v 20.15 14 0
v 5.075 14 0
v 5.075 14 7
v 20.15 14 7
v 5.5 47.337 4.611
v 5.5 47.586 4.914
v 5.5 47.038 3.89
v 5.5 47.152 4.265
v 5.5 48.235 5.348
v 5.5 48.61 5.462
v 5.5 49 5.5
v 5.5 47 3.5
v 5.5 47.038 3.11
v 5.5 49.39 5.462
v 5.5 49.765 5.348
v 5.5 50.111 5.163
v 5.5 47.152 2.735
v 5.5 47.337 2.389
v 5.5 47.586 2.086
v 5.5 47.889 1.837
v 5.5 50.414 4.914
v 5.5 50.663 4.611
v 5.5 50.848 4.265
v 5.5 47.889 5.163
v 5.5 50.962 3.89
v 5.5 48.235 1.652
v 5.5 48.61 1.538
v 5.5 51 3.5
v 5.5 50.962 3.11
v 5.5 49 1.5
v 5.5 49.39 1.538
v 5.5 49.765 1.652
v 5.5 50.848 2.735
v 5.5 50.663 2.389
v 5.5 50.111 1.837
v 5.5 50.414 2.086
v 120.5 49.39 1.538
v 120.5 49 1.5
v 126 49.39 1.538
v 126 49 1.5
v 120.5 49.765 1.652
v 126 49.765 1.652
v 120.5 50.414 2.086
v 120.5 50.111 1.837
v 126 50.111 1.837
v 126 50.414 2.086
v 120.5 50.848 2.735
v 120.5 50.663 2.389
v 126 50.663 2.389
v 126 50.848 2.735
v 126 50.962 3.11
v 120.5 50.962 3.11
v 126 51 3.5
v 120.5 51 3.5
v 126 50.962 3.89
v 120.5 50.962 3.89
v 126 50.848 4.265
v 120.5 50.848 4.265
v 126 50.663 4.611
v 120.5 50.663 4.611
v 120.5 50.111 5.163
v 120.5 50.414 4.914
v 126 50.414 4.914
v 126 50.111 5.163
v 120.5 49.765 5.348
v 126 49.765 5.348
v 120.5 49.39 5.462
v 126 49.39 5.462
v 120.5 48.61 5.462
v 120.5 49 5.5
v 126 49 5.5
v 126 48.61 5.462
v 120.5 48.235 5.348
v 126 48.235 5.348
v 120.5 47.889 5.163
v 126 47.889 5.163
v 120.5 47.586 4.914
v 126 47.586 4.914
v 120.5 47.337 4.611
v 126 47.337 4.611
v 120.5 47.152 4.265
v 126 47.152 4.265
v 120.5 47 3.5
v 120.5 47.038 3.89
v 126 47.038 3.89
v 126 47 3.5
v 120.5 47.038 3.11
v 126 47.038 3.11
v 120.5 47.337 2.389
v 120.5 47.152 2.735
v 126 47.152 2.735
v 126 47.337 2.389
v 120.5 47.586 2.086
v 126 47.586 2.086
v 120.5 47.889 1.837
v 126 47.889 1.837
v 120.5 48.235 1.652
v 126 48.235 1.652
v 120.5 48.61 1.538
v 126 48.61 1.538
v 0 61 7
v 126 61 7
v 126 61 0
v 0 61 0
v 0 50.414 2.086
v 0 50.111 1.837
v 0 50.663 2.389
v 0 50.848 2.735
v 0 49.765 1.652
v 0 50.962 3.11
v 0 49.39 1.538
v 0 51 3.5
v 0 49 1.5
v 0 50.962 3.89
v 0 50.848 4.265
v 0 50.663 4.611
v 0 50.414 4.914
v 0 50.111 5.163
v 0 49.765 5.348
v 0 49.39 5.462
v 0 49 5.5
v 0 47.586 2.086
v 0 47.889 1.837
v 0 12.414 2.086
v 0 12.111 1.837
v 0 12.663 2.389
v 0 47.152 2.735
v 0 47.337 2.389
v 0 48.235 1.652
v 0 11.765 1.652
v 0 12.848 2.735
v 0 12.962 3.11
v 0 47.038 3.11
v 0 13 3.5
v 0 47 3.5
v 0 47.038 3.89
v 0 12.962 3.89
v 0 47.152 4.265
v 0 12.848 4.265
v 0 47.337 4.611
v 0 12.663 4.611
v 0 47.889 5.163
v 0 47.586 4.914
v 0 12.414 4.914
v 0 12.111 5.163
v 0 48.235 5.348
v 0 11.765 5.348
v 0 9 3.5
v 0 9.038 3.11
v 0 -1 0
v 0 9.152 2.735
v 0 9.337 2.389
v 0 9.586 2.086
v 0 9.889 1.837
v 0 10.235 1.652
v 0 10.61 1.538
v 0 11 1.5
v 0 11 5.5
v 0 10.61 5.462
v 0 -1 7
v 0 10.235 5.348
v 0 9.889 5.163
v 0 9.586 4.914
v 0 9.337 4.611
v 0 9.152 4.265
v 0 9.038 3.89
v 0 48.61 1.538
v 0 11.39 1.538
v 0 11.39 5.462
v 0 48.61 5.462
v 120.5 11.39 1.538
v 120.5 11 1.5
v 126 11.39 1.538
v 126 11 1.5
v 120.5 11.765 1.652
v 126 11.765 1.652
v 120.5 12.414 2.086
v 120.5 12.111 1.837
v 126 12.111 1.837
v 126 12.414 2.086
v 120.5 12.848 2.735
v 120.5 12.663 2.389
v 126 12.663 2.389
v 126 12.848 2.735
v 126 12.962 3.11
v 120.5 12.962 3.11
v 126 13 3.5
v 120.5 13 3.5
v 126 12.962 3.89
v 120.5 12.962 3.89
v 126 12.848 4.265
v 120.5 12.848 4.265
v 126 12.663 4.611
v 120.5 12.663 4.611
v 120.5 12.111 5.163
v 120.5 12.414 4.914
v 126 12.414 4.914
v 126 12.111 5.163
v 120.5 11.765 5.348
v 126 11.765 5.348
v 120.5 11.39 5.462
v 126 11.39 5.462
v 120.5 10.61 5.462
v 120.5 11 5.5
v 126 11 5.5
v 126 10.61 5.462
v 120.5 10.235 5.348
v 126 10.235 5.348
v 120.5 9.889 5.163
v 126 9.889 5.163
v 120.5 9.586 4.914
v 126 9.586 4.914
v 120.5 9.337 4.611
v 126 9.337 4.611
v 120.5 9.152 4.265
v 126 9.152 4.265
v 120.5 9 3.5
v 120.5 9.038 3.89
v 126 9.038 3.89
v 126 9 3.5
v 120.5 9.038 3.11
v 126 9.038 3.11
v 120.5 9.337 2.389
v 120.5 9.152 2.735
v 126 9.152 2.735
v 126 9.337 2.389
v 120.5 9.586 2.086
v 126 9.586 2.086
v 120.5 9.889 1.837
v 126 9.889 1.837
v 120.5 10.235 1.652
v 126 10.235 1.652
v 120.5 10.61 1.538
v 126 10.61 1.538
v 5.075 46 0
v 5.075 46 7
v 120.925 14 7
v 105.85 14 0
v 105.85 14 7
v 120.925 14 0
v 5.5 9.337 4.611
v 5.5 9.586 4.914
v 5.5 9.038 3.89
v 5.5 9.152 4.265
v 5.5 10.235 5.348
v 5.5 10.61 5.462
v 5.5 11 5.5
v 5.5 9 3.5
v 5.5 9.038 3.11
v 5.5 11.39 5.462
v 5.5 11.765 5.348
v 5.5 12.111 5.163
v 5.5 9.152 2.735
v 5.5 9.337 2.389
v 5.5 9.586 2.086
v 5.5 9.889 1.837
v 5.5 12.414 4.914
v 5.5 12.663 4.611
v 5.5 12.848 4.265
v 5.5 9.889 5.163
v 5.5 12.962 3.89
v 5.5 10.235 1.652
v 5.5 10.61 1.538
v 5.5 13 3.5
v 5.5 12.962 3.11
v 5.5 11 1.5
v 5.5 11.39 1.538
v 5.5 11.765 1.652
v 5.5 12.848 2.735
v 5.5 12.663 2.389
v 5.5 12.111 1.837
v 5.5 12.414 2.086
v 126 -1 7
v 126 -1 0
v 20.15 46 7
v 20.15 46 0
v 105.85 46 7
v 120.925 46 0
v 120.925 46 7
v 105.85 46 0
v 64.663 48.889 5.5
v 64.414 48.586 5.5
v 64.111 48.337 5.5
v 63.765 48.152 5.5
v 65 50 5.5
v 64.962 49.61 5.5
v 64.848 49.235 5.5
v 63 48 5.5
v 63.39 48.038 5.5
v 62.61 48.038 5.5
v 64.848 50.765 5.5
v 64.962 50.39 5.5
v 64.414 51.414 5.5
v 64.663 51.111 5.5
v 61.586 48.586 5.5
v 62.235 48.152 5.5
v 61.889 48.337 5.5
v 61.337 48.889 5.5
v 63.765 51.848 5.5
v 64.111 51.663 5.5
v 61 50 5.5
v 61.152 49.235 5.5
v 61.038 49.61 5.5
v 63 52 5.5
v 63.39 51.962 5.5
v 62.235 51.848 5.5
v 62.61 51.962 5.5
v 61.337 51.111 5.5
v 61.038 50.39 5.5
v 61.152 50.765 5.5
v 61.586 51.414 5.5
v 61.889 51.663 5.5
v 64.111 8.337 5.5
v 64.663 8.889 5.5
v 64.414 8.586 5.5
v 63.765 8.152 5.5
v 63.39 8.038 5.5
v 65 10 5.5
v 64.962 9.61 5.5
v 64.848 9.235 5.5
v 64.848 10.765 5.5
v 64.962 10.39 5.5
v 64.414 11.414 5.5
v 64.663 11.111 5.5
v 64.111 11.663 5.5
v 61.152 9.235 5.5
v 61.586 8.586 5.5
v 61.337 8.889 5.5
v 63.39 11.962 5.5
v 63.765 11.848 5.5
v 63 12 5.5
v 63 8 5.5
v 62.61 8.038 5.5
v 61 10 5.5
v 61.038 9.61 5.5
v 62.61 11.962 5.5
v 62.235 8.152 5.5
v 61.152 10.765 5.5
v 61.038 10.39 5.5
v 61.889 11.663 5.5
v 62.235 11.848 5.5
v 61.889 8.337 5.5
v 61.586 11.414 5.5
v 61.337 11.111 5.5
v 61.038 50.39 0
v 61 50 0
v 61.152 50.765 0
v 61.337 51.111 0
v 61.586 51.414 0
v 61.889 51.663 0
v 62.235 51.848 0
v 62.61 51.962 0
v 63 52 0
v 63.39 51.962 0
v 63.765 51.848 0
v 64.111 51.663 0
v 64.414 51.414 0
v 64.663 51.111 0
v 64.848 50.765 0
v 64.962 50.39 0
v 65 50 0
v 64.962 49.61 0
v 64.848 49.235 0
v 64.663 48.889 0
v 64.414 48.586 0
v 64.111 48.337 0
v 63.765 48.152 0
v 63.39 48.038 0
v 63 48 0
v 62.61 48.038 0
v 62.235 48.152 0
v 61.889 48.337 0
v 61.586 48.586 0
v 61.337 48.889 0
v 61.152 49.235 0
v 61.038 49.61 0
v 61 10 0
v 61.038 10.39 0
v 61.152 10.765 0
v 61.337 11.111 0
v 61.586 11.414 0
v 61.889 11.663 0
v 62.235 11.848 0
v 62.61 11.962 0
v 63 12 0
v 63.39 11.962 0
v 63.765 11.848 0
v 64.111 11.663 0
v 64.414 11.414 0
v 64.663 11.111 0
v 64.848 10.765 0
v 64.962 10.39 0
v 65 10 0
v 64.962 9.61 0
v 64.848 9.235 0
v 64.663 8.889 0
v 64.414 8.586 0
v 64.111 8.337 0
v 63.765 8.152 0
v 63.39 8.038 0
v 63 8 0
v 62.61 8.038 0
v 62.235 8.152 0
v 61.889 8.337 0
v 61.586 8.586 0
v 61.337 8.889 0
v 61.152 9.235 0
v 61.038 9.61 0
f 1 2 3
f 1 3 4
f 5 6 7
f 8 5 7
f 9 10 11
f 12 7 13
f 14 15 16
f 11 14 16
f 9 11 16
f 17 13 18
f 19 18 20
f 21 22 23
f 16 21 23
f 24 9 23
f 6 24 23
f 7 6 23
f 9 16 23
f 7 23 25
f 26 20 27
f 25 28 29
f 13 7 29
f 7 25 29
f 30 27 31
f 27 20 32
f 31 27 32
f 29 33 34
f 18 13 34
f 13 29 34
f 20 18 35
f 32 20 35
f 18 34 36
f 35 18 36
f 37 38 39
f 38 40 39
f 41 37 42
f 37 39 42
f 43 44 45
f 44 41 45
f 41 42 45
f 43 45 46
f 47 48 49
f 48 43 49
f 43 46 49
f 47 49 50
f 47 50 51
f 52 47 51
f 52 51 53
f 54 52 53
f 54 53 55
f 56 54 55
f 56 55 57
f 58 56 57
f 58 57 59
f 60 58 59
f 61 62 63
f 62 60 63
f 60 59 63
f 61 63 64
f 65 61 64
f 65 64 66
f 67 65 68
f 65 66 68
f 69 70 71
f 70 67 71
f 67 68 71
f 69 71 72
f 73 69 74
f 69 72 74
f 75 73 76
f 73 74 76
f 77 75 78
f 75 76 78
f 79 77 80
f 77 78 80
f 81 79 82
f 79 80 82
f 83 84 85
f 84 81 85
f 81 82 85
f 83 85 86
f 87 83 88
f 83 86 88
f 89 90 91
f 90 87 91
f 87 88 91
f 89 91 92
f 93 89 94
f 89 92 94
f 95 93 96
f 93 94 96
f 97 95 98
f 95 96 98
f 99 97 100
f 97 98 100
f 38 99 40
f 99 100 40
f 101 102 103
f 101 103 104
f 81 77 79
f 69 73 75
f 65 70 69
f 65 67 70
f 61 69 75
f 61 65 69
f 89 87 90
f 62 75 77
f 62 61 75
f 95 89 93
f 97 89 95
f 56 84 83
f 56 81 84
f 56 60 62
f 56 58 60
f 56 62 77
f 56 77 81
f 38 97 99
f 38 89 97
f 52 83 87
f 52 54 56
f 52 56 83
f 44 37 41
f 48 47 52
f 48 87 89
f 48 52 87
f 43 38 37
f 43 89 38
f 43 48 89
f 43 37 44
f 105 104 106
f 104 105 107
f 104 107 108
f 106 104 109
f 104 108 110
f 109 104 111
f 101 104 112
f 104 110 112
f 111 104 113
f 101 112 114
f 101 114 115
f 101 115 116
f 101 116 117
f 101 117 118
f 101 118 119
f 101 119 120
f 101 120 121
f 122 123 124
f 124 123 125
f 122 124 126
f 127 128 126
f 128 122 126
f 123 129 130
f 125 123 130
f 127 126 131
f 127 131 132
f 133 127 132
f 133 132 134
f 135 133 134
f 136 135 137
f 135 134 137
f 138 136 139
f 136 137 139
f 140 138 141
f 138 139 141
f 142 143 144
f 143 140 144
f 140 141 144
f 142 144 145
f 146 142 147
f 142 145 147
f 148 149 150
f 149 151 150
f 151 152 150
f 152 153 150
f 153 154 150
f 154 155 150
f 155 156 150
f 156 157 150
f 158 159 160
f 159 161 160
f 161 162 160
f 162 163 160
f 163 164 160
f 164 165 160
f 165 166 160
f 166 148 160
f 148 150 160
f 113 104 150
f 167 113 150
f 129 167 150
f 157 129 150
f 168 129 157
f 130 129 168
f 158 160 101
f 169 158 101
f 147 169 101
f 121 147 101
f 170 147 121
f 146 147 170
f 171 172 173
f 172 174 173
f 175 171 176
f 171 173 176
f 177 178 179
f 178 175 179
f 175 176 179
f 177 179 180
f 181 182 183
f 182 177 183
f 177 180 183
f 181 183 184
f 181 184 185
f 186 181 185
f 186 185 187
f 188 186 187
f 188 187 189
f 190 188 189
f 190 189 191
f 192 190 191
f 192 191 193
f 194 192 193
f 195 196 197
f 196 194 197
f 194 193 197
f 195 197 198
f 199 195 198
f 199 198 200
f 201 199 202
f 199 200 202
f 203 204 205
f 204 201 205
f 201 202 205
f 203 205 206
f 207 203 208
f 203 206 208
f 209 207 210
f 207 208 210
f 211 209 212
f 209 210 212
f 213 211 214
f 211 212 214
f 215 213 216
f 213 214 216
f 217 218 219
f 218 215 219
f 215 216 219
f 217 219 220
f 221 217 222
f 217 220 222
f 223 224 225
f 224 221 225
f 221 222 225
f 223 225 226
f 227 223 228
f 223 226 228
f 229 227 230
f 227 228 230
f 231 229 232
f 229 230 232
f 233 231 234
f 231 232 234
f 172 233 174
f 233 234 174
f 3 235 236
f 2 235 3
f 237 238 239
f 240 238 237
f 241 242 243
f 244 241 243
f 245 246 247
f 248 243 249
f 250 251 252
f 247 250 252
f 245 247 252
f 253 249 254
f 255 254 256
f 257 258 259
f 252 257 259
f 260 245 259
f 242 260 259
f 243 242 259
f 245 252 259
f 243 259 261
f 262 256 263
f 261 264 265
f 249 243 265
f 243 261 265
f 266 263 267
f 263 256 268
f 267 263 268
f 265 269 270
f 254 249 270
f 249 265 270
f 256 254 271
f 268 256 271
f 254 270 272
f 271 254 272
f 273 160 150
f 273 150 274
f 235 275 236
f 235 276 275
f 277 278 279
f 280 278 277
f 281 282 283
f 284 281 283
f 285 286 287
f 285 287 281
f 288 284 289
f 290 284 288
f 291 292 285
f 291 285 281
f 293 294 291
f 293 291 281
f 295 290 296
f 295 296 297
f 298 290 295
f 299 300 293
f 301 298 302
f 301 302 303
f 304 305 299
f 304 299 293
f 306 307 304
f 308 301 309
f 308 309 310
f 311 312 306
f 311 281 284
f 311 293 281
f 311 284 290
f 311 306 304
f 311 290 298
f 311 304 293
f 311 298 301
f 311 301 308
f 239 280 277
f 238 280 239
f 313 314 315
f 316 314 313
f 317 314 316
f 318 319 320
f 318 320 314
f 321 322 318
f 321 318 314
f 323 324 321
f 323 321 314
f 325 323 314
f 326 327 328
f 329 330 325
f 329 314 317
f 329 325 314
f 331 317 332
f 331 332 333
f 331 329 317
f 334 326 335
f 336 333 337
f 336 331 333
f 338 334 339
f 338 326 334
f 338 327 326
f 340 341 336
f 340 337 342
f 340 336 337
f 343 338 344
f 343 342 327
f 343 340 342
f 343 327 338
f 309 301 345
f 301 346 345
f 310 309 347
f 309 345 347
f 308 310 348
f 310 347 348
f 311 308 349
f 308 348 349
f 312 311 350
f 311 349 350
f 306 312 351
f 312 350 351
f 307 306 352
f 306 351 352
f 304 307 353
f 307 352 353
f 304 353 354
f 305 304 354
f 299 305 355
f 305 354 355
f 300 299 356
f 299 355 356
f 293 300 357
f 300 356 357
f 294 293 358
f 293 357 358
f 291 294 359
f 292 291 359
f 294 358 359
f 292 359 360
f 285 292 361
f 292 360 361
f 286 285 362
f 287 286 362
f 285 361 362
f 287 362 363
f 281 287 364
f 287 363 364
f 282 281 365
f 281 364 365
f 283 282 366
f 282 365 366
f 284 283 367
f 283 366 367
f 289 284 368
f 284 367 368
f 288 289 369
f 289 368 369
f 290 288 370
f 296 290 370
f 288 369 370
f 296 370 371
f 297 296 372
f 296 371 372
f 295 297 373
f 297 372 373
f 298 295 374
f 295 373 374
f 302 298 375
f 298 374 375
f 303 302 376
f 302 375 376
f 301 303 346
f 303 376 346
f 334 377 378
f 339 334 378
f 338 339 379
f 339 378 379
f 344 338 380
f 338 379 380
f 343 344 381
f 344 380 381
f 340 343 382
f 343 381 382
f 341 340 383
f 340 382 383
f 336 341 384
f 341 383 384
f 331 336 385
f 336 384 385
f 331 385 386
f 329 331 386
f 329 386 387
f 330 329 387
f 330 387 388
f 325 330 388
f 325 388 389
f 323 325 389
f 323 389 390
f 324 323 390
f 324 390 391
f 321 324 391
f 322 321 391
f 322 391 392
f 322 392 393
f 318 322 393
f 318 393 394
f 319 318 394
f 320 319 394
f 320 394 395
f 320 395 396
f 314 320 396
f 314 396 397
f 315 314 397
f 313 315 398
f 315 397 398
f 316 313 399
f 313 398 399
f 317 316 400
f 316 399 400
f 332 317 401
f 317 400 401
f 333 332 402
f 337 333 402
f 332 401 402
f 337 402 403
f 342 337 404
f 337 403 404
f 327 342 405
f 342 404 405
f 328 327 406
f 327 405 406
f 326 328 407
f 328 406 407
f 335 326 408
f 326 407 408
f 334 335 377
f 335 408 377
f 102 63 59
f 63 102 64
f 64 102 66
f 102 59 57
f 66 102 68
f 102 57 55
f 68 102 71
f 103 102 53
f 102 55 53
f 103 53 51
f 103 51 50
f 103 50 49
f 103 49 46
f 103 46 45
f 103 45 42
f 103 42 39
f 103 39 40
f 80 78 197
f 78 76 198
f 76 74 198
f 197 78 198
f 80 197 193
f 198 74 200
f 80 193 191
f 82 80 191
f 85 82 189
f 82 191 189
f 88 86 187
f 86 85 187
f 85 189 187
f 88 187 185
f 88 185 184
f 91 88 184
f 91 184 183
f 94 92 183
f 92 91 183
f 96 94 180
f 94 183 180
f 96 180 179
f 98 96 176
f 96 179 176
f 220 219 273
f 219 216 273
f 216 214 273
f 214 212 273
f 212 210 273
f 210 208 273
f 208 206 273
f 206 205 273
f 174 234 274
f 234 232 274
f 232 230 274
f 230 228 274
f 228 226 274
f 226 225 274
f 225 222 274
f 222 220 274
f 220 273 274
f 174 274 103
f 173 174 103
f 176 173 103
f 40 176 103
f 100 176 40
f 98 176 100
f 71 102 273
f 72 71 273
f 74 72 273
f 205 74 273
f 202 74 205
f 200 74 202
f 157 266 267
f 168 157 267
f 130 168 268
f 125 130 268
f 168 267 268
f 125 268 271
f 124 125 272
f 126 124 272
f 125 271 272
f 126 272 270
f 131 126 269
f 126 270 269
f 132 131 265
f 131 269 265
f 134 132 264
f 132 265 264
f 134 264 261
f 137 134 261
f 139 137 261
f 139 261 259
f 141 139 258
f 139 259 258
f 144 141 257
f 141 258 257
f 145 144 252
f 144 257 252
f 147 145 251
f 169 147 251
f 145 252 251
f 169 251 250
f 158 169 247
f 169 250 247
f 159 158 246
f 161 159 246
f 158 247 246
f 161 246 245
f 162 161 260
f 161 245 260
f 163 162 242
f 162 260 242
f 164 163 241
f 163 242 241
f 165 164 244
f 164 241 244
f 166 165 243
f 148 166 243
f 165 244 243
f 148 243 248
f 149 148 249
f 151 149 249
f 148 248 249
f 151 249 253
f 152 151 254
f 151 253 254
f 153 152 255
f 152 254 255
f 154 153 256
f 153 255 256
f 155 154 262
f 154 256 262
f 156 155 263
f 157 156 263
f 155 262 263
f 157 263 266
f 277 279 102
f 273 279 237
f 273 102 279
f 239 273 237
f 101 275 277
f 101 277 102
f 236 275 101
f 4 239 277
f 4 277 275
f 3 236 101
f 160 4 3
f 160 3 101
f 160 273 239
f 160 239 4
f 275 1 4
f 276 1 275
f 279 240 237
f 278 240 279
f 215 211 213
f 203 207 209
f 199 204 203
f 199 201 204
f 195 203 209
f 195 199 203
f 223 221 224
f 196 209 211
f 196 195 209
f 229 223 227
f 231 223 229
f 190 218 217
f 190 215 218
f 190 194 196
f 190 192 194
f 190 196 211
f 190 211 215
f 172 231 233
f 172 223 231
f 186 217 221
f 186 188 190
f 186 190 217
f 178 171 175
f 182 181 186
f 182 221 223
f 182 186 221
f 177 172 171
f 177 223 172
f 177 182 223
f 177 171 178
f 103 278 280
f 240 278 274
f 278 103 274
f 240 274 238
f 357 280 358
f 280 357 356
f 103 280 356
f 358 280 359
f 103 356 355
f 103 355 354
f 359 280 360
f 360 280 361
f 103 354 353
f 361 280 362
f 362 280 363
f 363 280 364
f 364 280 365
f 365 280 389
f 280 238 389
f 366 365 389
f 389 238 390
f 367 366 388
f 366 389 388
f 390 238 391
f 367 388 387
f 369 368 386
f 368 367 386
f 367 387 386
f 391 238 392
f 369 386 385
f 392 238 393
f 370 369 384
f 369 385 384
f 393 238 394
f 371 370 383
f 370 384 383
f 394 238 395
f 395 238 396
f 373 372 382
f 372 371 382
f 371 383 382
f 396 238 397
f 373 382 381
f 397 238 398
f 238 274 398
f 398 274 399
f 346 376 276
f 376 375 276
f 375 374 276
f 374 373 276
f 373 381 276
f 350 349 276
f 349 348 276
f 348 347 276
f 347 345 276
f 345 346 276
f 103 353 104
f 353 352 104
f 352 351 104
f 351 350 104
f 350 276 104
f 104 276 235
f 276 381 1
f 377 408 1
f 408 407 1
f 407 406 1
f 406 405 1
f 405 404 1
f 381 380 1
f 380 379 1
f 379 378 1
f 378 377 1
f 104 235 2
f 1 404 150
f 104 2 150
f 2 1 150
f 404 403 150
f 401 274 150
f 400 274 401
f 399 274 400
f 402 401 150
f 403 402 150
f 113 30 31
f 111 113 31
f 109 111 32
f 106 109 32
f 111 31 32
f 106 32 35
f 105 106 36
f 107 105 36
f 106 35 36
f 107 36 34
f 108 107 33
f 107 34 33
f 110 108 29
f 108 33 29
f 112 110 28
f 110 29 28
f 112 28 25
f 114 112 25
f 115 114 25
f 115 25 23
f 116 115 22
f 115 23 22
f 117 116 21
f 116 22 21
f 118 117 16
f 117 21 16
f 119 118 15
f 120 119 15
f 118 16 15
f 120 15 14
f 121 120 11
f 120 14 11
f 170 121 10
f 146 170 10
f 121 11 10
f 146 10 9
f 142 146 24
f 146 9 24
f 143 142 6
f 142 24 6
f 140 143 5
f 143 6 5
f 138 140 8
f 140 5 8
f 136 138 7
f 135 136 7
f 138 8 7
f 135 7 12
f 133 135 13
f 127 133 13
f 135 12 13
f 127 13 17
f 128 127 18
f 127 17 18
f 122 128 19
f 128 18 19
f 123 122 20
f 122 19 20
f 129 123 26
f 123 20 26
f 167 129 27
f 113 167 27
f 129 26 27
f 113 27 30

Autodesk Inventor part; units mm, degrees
ref_plane "YZ Plane" through (0, 0, 0) normal (1, 0, 0) x (0, 1, 0)
ref_plane "XZ Plane" through (0, 0, 0) normal (0, 1, 0) x (-1, 0, 0)
sketch "Sketch2" plane through (0, 0, 0) normal (0, 0, 1) x (1, 0, 0)
  line L0 (0, 0) -> (126, 0)
  line L1 (126, 0) -> (126, 60)
  line L2 (126, 60) -> (0, 60)
  line L3 (0, 60) -> (0, 0)
  dimension "d1" = 126
  dimension "d2" = 60
extrude "Extrusion1" add sketch "Sketch2" along normal blind 7
sketch "Sketch3" plane through (126, 0, 0) normal (1, 0, 0) x (0, 0, -1)
  line L0 (0, 0) -> (-7, 0) projected
  line L1 (-3.5, 0) -> (-3.5, 11)
  circle A0 centre (-3.5, 11) radius 2
  dimension "d5" = 11
  dimension "d6" = 4
extrude "Extrusion2" cut sketch "Sketch3" against normal blind 5.5
pattern_linear "Rectangular Pattern1" count 2 spacing -120.5 along (1, 0, 0) count 2 spacing 38 along (0, 1, 0) of "Extrusion2"
sketch "Sketch4" plane through (0, 0, 0) normal (0, -1, 0) x (1, 0, 0)
  line L0 (0, 7) -> (126, 7) projected
  line L1 (0, 0) -> (126, 0)
  line L2 (126, 0) -> (126, 7)
  line L3 (126, 7) -> (0, 7)
  line L4 (0, 7) -> (0, 0)
ref_plane "Work Plane1" through (0, 30, 0) normal (0, -1, 0) x (1, 0, 0)
extrude "Extrusion3" add sketch "Sketch4" along normal blind 1
mirror "Mirror1" about plane through (0, 30, 0) normal (0, -1, 0) of "Extrusion3"
sketch "Sketch5" plane through (0, 0, 0) normal (0, 0, -1) x (-1, 0, 0)
  line L0 (0, 61) -> (-126, 61) projected
  line L1 (0, -1) -> (0, 61) projected
  line L2 (0, 30) -> (-63, 30)
  line L3 (-63, 50) -> (-63, 10)
  circle A0 centre (-63, 10) radius 2
  circle A1 centre (-63, 50) radius 2
  point P0 (0, 0)
  dimension "d17" = 40
  dimension "d18" = 4
extrude "Extrusion4" cut sketch "Sketch5" against normal blind 5.5
sketch "Sketch7" plane through (0, 0, 0) normal (0, 0, -1) x (-1, 0, 0)
  line L0 (0, -1) -> (0, 61) projected
  line L1 (0, 30) -> (-25.15, 30)
  line L2 (0, 30) -> (-5, 30)
  line L3 (-25.15, 30) -> (-20.15, 30)
  line L4 (-12.575, -1) -> (-12.575, 14)
  line L5 (-12.575, -1) -> (2.425, -1) construction
  line L6 (-5.075, 14) -> (-20.15, 14)
  line L7 (-20.15, 14) -> (-20.15, 46)
  line L8 (-20.15, 46) -> (-5.075, 46)
  line L9 (-5.075, 46) -> (-5.075, 14)
  point P0 (0, 0)
  dimension "d29" = 25.15
  dimension "d30" = 5
  dimension "d31" = 5
  dimension "d32" = 15
  dimension "d33" = 90
  dimension "d34" = 32
extrude "Extrusion6" cut sketch "Sketch7" against normal up to surface (7 mm away)
ref_plane "Work Plane2" through (63, -1, 0) normal (-1, 0, 0) x (0, 0, 1)
mirror "Mirror2" about plane through (63, -1, 0) normal (-1, 0, 0) of "Extrusion6"
properties part number "base3"
